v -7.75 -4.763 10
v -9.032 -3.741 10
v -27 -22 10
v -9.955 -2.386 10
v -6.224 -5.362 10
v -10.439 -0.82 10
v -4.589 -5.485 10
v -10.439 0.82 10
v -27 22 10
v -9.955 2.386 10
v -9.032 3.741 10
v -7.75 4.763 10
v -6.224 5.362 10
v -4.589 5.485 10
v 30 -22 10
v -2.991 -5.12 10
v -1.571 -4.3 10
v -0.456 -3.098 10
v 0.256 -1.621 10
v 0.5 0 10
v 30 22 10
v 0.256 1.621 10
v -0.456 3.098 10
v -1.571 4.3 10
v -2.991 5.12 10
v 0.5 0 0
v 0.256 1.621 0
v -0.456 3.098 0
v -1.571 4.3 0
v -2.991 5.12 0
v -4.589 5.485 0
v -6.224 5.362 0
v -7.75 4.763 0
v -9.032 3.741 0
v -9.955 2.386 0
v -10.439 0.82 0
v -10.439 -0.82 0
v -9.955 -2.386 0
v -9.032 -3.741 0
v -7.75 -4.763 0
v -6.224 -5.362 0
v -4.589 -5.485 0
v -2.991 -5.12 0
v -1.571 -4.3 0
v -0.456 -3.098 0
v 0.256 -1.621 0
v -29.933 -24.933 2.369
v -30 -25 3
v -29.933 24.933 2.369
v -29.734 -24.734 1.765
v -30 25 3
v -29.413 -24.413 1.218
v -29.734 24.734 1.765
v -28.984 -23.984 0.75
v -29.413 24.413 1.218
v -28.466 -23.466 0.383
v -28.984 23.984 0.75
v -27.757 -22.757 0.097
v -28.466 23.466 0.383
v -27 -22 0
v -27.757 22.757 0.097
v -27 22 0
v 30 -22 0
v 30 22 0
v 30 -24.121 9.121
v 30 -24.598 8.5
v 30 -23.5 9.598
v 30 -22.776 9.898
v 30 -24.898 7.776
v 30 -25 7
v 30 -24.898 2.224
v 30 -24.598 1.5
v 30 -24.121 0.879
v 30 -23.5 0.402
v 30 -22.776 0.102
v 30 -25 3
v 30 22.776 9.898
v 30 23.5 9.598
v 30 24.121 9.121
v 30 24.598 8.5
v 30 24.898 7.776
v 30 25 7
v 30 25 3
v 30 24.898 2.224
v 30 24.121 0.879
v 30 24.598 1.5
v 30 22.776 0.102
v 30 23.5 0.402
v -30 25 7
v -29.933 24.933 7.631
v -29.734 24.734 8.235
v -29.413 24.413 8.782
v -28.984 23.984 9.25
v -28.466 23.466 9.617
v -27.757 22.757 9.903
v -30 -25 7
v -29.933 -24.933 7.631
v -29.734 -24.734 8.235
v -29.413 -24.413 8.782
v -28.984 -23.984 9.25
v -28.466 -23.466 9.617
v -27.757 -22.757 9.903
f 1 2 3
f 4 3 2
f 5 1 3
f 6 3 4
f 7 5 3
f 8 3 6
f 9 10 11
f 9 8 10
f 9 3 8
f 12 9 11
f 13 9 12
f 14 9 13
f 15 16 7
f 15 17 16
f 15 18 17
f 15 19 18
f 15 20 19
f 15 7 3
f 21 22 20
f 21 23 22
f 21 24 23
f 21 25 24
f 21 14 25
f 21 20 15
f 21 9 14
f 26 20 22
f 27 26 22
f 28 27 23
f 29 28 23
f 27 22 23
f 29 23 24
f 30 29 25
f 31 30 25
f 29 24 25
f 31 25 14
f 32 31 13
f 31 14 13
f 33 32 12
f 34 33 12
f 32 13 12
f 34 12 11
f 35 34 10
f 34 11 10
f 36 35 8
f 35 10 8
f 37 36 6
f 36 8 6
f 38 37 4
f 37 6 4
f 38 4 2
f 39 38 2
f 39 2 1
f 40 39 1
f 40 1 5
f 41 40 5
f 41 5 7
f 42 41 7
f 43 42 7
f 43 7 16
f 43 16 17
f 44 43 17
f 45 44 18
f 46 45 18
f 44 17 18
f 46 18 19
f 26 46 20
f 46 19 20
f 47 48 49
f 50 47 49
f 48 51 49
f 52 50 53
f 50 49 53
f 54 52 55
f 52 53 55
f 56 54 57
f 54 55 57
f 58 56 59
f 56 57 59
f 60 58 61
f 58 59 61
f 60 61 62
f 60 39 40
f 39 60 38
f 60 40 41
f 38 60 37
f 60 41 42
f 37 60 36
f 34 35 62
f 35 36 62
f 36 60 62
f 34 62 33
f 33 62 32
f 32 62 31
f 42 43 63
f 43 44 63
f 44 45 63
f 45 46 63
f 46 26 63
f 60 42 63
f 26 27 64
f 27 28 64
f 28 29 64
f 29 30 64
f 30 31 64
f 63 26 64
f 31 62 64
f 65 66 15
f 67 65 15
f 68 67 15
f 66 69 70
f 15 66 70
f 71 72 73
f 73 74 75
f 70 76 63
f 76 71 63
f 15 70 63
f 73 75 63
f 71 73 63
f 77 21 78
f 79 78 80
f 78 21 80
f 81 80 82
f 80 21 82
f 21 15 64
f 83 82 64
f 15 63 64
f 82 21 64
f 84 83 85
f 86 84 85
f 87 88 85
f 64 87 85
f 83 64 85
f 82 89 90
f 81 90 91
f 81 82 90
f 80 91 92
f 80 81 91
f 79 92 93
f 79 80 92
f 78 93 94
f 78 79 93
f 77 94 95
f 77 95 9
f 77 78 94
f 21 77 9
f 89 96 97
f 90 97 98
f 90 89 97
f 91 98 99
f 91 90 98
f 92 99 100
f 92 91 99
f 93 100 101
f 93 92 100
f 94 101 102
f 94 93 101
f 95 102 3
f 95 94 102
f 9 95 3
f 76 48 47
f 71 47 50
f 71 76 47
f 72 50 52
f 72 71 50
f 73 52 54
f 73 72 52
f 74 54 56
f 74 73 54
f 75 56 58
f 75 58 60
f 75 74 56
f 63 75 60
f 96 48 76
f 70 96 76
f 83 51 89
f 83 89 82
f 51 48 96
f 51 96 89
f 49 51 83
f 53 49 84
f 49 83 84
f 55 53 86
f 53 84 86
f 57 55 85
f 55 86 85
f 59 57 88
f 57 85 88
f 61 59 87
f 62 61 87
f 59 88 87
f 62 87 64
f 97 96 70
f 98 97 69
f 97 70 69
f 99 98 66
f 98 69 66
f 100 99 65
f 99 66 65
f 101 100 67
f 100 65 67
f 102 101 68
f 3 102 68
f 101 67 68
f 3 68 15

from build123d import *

# Parameters (mm, degrees)
SKETCH_1_W          = 60
SKETCH_1_H          = 50
EXTRUDE_1_DEPTH     = 10
SKETCH_2_R          = 5.5
CUT_EXTRUDE_1_DEPTH = 10
FILLET_1_R          = 3


with BuildPart() as part:
    # 草图1 → 凸台-拉伸1 (new body)
    with BuildSketch(Plane.XY):
        Rectangle(SKETCH_1_W, SKETCH_1_H)
    extrude(amount=EXTRUDE_1_DEPTH)

    # 草图2 → 切除-拉伸1 (cut)
    with BuildSketch(Plane.XY.offset(10)):
        with Locations((-5, 0)):
            Circle(SKETCH_2_R)
    extrude(amount=-CUT_EXTRUDE_1_DEPTH, mode=Mode.SUBTRACT)

    # 圆角1
    fillet_1_edges = [part.edges().sort_by_distance(p)[0] for p in [
        (-30, 0, 10),
        (0, -25, 10),
        (0, -25, 0),
        (-30, 0, 0),
        (0, 25, 0),
        (0, 25, 10),
    ]]
    fillet(fillet_1_edges, radius=FILLET_1_R)


solid = part.part
